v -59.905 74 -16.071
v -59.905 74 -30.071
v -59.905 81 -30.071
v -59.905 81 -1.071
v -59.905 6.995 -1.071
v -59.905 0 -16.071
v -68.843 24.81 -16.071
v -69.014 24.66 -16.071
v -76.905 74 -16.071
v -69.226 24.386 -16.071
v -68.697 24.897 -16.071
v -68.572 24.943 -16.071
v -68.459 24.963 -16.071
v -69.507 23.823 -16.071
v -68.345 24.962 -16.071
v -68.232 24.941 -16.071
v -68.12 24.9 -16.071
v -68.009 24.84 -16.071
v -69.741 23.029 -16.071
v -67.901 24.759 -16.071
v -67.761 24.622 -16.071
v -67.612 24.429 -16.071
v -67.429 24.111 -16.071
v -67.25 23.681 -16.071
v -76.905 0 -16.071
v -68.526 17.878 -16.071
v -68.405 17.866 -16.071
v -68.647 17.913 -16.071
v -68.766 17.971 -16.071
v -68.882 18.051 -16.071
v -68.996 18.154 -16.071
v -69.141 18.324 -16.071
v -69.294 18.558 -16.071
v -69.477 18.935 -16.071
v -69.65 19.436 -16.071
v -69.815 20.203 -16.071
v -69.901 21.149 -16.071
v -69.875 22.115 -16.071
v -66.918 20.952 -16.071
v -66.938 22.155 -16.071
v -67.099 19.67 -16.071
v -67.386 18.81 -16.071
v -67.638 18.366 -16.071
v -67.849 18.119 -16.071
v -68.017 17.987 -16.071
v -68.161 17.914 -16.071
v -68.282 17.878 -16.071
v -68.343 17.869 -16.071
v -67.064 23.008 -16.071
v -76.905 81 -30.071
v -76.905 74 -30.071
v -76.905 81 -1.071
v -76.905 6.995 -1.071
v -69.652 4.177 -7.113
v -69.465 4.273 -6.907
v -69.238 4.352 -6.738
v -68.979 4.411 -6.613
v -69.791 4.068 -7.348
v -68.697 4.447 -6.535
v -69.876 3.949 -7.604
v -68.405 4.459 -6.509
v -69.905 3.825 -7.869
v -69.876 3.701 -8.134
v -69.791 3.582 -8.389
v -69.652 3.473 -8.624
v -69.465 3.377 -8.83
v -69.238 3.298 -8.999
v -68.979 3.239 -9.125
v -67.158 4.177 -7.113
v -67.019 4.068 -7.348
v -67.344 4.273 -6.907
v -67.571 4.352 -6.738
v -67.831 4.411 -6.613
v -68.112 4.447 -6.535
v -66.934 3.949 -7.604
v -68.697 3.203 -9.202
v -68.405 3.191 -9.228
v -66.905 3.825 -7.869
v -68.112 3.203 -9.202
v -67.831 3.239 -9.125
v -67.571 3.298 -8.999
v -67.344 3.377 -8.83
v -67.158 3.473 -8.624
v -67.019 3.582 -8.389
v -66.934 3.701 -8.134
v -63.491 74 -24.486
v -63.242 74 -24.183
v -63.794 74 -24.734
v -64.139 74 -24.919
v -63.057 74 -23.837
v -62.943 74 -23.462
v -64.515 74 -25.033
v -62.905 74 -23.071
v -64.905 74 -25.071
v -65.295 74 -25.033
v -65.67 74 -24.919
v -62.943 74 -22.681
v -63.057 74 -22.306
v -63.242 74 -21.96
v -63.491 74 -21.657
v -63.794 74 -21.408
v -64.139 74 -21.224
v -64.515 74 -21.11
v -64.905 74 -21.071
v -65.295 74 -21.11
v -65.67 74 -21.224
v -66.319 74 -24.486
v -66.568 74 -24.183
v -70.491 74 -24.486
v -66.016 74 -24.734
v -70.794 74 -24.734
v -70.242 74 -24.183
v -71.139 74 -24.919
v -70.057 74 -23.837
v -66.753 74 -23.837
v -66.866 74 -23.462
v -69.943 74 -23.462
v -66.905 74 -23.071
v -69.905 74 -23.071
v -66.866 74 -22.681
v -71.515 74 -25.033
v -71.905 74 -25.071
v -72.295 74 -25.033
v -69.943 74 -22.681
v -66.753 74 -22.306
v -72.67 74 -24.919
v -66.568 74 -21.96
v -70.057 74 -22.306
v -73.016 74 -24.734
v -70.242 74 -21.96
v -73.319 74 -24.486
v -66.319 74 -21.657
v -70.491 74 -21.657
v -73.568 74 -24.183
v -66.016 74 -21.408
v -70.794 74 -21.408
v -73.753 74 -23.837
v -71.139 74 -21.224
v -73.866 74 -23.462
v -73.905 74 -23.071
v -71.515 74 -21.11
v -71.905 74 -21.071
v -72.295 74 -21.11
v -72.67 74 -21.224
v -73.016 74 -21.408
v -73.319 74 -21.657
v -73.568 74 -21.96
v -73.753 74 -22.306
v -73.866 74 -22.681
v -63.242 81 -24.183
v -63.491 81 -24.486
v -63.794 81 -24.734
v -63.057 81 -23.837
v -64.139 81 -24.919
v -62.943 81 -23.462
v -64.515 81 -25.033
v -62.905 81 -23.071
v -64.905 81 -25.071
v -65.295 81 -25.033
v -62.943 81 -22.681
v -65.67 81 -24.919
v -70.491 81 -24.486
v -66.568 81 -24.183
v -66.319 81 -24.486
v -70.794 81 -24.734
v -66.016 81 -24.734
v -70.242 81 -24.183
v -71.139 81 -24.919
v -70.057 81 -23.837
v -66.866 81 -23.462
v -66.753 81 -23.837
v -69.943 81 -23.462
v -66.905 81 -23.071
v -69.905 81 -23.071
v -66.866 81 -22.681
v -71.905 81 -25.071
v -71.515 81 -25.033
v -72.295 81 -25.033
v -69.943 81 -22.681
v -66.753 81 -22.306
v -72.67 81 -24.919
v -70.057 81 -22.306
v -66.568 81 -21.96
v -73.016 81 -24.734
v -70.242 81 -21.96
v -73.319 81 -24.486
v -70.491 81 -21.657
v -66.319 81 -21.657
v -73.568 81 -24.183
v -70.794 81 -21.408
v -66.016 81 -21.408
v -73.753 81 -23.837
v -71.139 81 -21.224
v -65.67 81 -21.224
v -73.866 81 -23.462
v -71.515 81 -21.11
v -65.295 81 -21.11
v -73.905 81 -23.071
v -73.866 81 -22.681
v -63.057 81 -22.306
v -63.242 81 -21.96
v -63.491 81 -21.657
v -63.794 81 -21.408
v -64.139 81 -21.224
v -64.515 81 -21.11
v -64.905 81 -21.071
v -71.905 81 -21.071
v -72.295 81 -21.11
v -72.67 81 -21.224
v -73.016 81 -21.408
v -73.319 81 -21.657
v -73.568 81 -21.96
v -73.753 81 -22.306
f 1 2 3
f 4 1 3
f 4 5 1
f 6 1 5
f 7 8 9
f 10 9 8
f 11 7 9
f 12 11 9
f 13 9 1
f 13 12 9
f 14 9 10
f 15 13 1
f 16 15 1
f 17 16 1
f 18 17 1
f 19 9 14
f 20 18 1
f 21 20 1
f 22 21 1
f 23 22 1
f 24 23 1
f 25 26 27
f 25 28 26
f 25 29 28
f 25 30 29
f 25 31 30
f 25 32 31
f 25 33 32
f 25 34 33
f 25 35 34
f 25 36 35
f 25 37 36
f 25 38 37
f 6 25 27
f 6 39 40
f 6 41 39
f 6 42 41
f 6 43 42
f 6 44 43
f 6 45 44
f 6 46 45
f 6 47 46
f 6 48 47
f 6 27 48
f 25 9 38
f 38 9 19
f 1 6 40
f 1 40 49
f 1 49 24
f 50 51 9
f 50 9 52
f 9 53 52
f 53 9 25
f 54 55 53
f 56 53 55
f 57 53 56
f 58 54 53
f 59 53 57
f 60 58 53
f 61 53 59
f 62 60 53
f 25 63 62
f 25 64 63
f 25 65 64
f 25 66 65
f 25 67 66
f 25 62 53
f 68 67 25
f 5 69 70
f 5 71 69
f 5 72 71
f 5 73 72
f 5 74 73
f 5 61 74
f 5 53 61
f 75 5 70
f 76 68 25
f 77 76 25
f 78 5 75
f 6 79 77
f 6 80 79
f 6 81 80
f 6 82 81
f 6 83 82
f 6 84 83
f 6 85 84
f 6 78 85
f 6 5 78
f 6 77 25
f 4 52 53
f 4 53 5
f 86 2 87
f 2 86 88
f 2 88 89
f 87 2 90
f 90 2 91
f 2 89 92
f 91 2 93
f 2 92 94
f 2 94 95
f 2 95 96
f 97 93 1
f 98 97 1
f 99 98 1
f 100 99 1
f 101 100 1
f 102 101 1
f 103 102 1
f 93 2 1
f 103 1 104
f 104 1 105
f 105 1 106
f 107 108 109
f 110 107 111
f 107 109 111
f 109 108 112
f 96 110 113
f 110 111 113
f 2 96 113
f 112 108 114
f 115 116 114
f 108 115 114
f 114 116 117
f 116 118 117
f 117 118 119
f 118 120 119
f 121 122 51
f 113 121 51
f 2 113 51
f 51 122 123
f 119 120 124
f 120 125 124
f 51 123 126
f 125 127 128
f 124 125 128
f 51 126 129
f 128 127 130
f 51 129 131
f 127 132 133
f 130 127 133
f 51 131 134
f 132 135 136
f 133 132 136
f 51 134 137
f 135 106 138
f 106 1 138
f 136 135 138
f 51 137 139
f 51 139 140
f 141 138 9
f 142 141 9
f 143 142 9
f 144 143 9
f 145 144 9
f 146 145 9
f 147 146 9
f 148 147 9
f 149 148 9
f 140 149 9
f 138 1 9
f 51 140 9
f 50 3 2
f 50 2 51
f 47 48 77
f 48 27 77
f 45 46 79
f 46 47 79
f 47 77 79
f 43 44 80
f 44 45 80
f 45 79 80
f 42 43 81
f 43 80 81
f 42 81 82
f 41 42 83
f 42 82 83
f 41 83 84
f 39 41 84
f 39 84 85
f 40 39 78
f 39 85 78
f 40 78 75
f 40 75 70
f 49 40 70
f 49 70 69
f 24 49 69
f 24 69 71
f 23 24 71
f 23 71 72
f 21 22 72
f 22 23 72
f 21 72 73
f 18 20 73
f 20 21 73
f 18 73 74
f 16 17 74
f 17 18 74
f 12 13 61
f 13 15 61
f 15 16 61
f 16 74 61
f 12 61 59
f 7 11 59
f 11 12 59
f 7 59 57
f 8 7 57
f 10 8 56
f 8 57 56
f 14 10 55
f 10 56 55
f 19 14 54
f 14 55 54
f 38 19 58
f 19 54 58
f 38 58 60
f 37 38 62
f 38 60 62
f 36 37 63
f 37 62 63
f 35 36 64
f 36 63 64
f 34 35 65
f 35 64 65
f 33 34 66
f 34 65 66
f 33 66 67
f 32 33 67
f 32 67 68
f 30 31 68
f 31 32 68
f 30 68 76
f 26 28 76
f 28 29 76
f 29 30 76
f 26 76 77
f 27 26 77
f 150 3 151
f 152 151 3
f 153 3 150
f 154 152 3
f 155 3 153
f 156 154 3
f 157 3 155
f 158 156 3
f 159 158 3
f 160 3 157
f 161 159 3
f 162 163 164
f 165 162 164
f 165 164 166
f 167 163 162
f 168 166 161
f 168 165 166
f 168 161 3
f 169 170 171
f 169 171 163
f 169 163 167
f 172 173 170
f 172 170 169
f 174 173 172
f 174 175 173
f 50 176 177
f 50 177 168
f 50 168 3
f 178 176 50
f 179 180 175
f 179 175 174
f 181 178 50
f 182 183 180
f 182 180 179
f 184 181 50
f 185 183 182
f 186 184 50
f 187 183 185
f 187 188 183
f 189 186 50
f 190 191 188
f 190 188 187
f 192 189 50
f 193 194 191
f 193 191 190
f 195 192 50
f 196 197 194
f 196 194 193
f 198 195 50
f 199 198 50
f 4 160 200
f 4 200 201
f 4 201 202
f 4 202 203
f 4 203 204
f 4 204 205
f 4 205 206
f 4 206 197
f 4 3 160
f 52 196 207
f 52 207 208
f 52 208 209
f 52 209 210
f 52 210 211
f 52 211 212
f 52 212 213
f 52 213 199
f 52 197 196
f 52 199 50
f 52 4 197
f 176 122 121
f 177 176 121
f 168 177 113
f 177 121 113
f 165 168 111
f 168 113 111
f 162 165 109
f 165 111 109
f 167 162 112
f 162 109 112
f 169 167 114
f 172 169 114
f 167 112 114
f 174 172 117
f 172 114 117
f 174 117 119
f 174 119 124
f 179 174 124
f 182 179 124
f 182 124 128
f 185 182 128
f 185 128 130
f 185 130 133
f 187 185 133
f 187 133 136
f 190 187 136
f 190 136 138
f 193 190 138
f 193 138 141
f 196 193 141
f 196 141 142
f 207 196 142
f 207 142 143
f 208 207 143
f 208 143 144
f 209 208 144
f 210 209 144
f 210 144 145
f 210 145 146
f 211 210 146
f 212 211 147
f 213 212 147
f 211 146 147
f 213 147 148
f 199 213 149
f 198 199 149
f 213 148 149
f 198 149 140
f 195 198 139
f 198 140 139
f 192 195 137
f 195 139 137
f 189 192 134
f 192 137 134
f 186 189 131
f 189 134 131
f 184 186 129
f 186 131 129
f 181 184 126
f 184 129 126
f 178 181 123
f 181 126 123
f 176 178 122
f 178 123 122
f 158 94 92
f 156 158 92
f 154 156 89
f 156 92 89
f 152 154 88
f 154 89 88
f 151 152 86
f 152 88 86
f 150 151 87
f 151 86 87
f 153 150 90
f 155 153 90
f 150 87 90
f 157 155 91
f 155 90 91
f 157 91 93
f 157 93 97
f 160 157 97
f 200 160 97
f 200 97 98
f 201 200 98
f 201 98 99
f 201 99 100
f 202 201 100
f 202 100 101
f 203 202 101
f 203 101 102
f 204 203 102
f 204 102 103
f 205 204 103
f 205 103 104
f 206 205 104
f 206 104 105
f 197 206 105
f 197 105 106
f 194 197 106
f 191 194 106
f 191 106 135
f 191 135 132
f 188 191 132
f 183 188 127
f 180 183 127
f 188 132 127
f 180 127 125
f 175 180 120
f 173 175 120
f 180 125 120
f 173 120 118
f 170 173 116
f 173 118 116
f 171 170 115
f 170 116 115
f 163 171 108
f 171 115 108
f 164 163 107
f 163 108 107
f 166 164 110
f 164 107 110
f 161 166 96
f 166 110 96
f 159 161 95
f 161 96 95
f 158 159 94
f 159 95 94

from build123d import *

# Parameters (mm, degrees)
SKETCH1_W           = 17
SKETCH1_H           = 15
BOSS_EXTRUDE1_DEPTH = 81
CUT_EXTRUDE1_DEPTH  = 40
SKETCH3_R           = 1.5
CUT_EXTRUDE2_DEPTH  = 36
SKETCH4_W           = 17
SKETCH4_H           = 7
BOSS_EXTRUDE2_DEPTH = 14
SKETCH5_R           = 2
CUT_EXTRUDE3_DEPTH  = 14


with BuildPart() as part:
    # Sketch1 → Boss-Extrude1 (new body)
    with BuildSketch(Plane(origin=(0, 0, 0), x_dir=(1, 0, 0), z_dir=(0, 1, 0))):
        with Locations((-68.404761905, 8.571428571)):
            Rectangle(SKETCH1_W, SKETCH1_H)
    extrude(amount=BOSS_EXTRUDE1_DEPTH)

    # Sketch2 → Cut-Extrude1 (cut)
    with BuildSketch(Plane(origin=(-59.904761905, 0, 0), x_dir=(0, 0, -1), z_dir=(1, 0, 0))):
        Polygon((16.071428571, 0), (1.071428571, 0), (1.071428571, 6.994614872), align=None)
    extrude(amount=-CUT_EXTRUDE1_DEPTH, mode=Mode.SUBTRACT)

    # Sketch3 → Cut-Extrude2 (cut)
    with BuildSketch(Plane(origin=(0, 6.155714275, -2.870456708), x_dir=(1, 0, 0), z_dir=(0, -0.9063077870366528, 0.4226182617406934))):
        with Locations(Location((-68.404761905, -5.514992079, 0), (0, 0, 270))):
            Circle(SKETCH3_R)
    extrude(amount=-CUT_EXTRUDE2_DEPTH, mode=Mode.SUBTRACT)

    # Sketch4 → Boss-Extrude2 (add)
    with BuildSketch(Plane(origin=(0, 0, -16.071428571), x_dir=(-1, 0, 0), z_dir=(0, 0, -1))):
        with Locations((68.404761905, 77.5)):
            Rectangle(SKETCH4_W, SKETCH4_H)
    extrude(amount=BOSS_EXTRUDE2_DEPTH)

    # Sketch5 → Cut-Extrude3 (cut)
    with BuildSketch(Plane(origin=(0, 74, 0), x_dir=(-1, 0, 0), z_dir=(0, -1, 0))):
        with Locations(Location((71.904761905, 23.071428571, 0), (0, 0, 90))):
            Circle(SKETCH5_R)
        with Locations(Location((64.904761905, 23.071428571, 0), (0, 0, 90))):
            Circle(SKETCH5_R)
    extrude(amount=-CUT_EXTRUDE3_DEPTH, mode=Mode.SUBTRACT)


solid = part.part
